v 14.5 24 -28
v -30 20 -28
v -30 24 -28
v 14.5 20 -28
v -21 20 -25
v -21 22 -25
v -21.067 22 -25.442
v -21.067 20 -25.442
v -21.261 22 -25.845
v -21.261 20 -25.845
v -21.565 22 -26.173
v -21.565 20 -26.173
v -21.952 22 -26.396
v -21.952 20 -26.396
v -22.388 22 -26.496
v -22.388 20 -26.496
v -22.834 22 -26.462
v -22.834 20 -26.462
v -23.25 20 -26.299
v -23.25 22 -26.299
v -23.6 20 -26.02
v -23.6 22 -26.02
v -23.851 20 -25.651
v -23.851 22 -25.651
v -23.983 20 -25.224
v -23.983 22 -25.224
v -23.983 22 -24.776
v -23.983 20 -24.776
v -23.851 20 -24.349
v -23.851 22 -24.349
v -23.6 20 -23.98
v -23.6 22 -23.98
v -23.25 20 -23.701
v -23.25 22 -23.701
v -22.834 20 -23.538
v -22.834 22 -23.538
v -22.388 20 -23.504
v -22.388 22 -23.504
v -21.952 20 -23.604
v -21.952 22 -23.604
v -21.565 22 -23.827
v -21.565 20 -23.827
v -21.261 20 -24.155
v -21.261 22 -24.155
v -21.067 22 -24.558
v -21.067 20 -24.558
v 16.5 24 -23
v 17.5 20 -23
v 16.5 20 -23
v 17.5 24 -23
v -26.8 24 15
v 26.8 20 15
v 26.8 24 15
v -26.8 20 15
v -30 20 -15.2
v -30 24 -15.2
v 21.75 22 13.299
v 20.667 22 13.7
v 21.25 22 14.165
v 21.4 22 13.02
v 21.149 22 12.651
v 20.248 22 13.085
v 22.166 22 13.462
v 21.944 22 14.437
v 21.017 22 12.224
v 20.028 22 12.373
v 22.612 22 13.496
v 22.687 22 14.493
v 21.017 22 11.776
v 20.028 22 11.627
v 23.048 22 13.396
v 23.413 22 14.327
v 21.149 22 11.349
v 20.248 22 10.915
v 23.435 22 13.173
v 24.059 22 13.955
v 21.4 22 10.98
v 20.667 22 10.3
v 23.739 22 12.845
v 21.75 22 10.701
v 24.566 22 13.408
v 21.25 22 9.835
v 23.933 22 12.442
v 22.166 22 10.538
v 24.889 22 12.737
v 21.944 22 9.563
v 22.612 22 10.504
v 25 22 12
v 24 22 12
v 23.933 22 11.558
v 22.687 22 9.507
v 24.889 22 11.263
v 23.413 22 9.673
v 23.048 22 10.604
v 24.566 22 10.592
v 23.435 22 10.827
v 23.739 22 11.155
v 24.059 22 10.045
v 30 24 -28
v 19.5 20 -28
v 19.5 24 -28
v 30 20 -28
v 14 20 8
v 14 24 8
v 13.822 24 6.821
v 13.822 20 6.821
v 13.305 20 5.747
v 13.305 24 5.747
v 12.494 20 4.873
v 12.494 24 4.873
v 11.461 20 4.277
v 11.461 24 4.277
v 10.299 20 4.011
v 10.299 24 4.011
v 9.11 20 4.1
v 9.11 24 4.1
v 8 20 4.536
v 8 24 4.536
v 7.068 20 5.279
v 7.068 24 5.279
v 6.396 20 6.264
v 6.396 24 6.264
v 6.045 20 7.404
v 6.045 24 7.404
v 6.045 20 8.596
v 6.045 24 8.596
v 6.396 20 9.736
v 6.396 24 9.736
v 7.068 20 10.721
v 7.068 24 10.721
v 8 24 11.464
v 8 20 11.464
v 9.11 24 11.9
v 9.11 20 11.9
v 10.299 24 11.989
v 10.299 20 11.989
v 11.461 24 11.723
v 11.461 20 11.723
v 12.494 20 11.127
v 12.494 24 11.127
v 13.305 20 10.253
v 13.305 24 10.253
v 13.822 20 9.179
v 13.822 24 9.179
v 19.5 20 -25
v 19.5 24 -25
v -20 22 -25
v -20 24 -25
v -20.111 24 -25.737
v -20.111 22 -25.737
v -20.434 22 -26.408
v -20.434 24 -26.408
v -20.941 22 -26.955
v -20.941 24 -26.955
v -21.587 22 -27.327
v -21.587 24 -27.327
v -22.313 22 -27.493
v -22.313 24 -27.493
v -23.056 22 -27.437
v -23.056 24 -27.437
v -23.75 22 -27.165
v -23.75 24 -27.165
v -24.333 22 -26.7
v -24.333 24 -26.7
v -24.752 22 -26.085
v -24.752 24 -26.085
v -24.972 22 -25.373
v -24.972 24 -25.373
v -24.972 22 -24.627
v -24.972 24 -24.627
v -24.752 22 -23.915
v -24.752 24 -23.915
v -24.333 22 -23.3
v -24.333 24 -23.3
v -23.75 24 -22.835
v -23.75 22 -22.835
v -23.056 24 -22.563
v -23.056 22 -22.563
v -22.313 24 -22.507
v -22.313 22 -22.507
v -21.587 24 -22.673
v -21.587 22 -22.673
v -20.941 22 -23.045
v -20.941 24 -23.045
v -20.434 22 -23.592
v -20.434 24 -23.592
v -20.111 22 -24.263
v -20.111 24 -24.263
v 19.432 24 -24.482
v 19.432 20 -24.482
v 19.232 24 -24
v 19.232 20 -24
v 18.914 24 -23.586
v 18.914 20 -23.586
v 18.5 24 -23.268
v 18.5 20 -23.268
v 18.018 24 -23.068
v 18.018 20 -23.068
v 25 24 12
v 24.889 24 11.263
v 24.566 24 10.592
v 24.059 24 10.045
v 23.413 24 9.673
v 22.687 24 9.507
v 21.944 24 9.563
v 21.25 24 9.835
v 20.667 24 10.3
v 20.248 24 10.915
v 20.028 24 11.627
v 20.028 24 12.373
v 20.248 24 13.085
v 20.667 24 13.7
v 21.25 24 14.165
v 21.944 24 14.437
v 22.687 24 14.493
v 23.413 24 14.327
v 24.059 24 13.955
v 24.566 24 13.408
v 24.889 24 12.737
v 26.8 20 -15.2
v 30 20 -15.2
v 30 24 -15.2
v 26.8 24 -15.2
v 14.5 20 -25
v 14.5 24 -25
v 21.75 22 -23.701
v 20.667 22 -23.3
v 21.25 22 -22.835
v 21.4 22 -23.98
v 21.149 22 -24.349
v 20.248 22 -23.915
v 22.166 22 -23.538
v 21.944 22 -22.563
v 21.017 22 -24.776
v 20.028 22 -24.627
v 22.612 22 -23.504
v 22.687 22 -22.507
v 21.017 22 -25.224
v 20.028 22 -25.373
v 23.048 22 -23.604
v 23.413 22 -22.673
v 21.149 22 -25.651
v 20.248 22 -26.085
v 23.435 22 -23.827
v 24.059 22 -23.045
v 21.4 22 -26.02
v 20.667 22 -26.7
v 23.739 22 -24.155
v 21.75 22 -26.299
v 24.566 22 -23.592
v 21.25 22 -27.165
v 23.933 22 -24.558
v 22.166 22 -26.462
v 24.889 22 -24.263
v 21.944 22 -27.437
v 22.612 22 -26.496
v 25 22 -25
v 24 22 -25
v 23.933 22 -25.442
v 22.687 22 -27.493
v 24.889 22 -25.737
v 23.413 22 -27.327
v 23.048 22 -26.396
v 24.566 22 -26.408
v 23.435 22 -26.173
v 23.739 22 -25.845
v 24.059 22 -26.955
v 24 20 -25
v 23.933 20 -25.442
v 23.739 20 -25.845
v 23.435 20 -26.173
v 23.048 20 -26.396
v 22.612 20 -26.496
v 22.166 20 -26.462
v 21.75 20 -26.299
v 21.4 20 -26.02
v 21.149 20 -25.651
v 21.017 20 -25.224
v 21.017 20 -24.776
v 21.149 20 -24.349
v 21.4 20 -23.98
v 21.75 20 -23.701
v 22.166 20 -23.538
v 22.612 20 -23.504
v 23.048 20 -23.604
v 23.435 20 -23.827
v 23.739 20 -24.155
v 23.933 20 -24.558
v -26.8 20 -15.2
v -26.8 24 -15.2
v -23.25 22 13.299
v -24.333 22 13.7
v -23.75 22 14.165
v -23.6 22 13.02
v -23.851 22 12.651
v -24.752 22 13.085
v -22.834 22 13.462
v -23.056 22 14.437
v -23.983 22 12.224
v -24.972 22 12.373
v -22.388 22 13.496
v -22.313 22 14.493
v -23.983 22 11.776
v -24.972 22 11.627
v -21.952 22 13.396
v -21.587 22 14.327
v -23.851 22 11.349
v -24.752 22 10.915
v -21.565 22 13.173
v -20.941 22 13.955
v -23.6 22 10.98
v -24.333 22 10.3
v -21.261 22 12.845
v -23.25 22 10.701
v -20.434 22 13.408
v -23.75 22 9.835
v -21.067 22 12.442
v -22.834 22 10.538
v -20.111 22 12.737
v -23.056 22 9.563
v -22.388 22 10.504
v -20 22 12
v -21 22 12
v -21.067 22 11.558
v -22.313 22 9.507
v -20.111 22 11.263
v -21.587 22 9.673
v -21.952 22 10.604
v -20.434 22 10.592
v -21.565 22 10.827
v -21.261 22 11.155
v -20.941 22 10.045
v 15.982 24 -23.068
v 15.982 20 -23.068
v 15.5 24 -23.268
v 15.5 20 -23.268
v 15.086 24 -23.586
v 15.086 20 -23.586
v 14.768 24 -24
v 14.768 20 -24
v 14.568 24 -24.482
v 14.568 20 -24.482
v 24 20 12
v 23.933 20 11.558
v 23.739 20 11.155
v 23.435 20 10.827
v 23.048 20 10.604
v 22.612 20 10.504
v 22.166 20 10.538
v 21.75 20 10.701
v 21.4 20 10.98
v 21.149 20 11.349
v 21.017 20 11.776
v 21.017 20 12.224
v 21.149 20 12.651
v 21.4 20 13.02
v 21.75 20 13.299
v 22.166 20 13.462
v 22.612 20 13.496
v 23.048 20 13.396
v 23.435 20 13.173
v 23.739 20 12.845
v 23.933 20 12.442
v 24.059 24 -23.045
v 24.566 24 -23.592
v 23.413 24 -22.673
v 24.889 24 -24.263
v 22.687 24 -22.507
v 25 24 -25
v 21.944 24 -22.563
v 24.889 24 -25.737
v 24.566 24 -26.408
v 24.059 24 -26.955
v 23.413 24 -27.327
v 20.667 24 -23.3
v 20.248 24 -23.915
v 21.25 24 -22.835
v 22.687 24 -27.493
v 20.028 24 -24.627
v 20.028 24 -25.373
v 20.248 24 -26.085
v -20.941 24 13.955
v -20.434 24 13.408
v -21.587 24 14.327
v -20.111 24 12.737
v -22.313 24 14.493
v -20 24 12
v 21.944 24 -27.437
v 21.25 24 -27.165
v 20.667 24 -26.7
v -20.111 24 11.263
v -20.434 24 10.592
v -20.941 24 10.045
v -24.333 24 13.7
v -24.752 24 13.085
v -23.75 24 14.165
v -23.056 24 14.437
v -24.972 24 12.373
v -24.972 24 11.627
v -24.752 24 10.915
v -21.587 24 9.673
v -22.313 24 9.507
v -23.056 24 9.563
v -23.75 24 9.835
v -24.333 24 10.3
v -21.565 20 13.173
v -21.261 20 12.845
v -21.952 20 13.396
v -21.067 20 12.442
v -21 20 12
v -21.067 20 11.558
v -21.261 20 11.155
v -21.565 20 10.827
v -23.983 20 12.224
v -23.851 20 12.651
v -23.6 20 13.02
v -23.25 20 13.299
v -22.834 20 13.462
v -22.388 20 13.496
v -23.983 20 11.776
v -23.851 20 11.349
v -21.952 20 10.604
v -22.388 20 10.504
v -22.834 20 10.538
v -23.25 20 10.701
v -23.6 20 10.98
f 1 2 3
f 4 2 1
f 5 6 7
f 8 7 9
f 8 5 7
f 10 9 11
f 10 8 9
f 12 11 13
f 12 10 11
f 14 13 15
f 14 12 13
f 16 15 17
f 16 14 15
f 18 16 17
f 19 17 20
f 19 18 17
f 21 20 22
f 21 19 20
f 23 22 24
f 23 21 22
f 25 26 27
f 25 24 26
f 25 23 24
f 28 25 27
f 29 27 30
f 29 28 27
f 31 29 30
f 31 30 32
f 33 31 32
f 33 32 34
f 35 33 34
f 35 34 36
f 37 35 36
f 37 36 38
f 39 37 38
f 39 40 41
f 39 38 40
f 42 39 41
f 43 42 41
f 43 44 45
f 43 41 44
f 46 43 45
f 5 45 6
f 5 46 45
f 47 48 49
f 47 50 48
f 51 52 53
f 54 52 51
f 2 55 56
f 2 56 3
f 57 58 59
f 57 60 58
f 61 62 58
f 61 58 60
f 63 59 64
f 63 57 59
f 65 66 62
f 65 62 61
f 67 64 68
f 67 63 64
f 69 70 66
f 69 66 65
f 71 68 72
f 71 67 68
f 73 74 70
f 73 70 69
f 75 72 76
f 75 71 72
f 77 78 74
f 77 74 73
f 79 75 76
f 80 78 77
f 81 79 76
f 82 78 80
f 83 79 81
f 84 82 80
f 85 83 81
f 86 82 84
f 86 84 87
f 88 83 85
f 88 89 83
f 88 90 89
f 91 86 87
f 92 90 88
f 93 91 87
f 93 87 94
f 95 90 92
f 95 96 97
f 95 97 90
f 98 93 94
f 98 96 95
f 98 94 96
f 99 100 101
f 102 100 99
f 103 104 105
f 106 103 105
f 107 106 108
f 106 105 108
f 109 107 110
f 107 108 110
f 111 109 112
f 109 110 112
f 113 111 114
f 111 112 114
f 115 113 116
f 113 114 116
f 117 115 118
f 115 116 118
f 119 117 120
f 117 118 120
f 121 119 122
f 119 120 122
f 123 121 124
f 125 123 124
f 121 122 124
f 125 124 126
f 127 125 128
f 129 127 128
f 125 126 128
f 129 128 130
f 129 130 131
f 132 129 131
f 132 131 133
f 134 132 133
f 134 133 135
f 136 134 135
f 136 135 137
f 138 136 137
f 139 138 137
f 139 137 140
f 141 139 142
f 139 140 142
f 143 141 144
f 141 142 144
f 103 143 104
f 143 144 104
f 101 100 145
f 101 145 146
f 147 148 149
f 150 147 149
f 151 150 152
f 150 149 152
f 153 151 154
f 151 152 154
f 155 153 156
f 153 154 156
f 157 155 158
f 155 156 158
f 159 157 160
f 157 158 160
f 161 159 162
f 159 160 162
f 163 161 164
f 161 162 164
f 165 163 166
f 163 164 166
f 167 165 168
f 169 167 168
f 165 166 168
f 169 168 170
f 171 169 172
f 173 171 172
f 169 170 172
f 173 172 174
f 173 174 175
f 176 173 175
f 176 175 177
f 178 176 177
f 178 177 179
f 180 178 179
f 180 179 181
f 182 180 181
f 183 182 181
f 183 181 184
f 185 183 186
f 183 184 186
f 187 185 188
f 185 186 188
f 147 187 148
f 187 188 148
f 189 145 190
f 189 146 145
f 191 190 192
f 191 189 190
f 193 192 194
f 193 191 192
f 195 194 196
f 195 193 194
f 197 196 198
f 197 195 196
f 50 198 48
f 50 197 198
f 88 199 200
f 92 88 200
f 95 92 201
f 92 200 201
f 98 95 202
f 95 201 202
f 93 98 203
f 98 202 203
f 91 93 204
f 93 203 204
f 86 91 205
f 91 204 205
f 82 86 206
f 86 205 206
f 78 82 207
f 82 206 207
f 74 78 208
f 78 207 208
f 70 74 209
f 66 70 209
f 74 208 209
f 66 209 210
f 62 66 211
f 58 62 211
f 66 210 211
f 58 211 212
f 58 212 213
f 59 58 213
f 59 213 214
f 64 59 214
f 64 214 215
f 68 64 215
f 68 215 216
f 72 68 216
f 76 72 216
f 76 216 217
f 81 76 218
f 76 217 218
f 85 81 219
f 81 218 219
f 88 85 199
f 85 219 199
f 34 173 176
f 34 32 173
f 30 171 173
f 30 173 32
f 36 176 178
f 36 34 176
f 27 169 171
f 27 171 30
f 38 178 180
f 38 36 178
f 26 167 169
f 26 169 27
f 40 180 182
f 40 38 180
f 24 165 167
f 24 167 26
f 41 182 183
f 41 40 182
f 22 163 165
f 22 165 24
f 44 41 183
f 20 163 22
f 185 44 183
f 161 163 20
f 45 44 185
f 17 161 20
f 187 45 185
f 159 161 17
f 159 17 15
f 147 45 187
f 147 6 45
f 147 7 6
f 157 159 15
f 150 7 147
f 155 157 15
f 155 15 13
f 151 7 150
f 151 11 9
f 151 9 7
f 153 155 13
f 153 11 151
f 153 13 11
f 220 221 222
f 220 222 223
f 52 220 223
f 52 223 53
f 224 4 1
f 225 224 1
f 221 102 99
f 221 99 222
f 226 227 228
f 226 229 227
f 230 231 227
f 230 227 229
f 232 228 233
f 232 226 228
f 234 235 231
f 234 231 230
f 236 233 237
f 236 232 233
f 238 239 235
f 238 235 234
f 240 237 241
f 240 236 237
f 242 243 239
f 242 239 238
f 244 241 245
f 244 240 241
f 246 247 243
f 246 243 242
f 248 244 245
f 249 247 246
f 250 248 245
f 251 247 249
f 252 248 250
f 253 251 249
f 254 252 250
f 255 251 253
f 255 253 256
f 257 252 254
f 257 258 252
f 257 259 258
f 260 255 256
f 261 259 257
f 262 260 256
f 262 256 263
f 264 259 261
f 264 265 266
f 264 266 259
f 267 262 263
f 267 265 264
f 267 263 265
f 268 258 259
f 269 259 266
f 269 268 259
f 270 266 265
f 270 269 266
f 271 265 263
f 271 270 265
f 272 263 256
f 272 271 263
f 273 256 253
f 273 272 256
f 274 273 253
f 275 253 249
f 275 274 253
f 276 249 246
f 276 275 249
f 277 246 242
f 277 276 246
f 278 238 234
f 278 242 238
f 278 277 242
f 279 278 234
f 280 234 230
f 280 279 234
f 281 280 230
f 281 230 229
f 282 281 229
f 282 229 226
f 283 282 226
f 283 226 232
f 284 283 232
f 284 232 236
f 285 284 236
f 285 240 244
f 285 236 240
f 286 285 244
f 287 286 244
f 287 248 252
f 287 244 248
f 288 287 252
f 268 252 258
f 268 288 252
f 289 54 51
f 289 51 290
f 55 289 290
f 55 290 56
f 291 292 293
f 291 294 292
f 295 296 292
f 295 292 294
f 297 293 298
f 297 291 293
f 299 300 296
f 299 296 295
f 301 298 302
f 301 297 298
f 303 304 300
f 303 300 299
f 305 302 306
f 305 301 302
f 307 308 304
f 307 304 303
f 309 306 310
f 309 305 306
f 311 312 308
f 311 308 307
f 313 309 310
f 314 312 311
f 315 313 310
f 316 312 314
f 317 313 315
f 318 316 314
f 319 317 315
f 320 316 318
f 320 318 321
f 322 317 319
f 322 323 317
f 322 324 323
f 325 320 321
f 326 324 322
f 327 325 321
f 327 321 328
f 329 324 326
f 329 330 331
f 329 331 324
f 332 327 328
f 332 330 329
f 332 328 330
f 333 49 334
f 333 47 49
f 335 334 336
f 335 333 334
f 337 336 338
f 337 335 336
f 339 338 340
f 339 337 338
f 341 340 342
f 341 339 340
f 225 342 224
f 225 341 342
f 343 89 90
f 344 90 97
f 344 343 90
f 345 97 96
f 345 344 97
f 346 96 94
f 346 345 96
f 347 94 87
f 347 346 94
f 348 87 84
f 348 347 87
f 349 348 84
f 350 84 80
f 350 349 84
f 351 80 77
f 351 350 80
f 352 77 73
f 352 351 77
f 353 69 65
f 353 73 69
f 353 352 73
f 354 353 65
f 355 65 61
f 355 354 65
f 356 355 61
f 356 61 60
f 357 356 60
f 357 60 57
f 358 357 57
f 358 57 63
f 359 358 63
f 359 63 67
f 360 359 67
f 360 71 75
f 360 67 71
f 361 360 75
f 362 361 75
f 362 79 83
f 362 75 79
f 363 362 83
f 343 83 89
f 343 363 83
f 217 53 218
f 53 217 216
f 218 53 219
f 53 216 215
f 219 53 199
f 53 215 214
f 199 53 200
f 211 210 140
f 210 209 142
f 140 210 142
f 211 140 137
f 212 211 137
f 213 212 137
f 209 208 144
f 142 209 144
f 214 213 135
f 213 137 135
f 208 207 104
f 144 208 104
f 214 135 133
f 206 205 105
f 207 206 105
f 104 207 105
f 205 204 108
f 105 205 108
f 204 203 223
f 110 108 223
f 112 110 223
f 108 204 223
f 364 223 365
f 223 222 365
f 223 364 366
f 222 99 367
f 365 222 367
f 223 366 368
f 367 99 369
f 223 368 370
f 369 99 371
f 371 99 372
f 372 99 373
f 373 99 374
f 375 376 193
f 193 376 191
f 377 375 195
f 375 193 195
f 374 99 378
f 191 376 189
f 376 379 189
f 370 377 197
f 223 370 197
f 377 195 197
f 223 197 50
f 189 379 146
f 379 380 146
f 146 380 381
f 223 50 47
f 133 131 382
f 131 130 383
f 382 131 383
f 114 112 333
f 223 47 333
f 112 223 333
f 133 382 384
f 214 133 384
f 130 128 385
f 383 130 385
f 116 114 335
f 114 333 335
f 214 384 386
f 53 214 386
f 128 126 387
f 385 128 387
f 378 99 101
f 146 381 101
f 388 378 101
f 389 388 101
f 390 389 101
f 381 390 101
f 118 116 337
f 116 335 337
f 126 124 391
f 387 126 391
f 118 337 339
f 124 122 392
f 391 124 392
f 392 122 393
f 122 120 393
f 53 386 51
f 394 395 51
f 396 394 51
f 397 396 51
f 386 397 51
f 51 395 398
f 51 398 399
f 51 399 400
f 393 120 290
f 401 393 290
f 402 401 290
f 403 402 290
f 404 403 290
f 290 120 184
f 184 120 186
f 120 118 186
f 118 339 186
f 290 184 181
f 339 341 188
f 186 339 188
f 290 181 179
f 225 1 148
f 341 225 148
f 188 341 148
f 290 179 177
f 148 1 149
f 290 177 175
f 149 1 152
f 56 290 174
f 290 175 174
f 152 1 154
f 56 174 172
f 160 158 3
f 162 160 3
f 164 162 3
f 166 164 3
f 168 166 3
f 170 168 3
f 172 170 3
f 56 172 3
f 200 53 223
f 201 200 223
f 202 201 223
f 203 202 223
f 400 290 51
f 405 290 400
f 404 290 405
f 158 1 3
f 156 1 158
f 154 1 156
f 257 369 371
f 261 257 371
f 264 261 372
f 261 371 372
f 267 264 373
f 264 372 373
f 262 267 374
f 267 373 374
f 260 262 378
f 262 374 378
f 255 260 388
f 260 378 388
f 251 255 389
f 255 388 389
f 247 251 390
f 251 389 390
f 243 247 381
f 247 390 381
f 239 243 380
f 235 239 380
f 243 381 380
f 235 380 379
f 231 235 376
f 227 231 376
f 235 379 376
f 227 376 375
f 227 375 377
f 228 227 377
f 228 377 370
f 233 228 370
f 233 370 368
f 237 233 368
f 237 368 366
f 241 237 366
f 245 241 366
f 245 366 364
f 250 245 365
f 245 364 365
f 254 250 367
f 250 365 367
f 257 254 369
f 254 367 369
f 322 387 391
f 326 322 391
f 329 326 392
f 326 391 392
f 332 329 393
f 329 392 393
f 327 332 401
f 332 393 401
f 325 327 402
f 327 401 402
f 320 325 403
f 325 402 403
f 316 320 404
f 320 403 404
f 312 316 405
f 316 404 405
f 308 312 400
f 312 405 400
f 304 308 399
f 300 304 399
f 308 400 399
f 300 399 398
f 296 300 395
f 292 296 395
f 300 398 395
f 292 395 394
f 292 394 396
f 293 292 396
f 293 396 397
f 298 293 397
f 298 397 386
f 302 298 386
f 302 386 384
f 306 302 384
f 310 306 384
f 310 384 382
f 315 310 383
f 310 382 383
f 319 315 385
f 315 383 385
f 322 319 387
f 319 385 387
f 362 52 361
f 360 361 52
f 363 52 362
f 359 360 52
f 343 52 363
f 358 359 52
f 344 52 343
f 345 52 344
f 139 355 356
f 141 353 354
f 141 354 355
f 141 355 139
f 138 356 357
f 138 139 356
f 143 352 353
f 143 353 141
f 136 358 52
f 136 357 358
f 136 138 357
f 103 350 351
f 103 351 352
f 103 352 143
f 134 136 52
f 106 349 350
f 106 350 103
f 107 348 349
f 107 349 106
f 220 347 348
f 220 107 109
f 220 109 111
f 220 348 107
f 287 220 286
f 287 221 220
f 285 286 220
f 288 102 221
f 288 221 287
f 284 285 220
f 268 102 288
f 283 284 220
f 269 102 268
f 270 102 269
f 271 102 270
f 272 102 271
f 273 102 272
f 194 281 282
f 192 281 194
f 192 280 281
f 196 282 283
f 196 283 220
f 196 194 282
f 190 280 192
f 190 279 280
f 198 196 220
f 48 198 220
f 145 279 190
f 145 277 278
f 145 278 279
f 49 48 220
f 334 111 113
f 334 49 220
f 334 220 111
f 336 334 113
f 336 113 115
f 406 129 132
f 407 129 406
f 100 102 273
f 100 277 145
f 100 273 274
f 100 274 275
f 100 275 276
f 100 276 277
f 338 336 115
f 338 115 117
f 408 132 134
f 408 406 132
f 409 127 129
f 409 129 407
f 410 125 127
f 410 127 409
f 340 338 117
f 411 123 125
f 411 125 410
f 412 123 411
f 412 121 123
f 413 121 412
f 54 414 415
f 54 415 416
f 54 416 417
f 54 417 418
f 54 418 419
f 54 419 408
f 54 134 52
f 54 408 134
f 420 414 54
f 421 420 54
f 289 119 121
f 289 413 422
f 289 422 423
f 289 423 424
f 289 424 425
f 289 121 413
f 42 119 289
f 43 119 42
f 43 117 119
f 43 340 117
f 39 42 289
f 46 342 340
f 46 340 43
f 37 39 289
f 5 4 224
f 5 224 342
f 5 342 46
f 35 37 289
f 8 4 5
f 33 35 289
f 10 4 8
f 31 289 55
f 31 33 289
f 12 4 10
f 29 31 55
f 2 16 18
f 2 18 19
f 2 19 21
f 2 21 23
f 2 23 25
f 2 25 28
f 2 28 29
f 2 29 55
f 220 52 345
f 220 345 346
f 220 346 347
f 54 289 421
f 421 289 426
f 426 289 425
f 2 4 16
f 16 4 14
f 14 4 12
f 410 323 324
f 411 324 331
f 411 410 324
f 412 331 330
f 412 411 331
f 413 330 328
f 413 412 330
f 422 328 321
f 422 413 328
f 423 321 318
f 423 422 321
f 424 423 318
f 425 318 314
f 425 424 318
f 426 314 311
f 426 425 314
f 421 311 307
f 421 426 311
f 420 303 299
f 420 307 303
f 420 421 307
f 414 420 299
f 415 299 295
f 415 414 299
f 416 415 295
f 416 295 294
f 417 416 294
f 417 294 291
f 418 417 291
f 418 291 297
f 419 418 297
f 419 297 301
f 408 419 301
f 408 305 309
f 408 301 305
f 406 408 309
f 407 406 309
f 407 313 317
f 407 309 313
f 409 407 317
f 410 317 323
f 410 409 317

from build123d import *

# Parameters (mm, degrees)
SKETCH060_R     = 1.5
PAD035_DEPTH    = 4
SKETCH061_R     = 2.5
POCKET025_DEPTH = 2
SKETCH048_W     = 5
SKETCH048_H     = 4
POCKET019_DEPTH = 5
FILLET012_R     = 2
FILLET013_R     = 2
SKETCH049_R     = 4
POCKET020_DEPTH = 4


with BuildPart() as part:
    # Sketch060 (on CopyDatumPlane) → Pad035 (new body)
    with BuildSketch(Plane(origin=(0, 20, 0), x_dir=(1, 0, 0), z_dir=(0, 1, 0))):
        Polygon((-30, 28), (30, 28), (30, 15.2), (26.8, 15.2), (26.8, -15), (-26.8, -15), (-26.8, 15.2), (-30, 15.2), align=None)
        with Locations((-22.5, 25)):
            Circle(SKETCH060_R, mode=Mode.SUBTRACT)
        with Locations((22.5, 25)):
            Circle(SKETCH060_R, mode=Mode.SUBTRACT)
        with Locations((22.5, -12)):
            Circle(SKETCH060_R, mode=Mode.SUBTRACT)
        with Locations((-22.5, -12)):
            Circle(SKETCH060_R, mode=Mode.SUBTRACT)
    extrude(amount=PAD035_DEPTH)

    # Sketch061 (on Face14 of Pad035) → Pocket025 (cut)
    with BuildSketch(Plane(origin=(0, 24, 0), x_dir=(1, 0, 0), z_dir=(0, 1, 0))):
        with Locations((-22.5, 25)):
            Circle(SKETCH061_R)
        with Locations((22.5, 25)):
            Circle(SKETCH061_R)
        with Locations((22.5, -12)):
            Circle(SKETCH061_R)
        with Locations((-22.5, -12)):
            Circle(SKETCH061_R)
    extrude(amount=-POCKET025_DEPTH, mode=Mode.SUBTRACT)

    # Sketch048 (on Face1 of Pocket025) → Pocket019 (cut)
    with BuildSketch(Plane(origin=(0, 20, -28), x_dir=(-1, 0, 0), z_dir=(0, 0, -1))):
        with Locations((-17, 2)):
            Rectangle(SKETCH048_W, SKETCH048_H)
    extrude(amount=-POCKET019_DEPTH, mode=Mode.SUBTRACT)

    # Fillet012
    fillet012_edges = [part.edges().sort_by_distance(p)[0] for p in [
        (19.5, 22, -23),
    ]]
    fillet(fillet012_edges, radius=FILLET012_R)

    # Fillet013
    fillet013_edges = [part.edges().sort_by_distance(p)[0] for p in [
        (14.5, 22, -23),
    ]]
    fillet(fillet013_edges, radius=FILLET013_R)

    # Sketch049 (on Face20 of Fillet013) → Pocket020 (cut)
    with BuildSketch(Plane(origin=(0, 24, 0), x_dir=(1, 0, 0), z_dir=(0, 1, 0))):
        with Locations((10, -8)):
            Circle(SKETCH049_R)
    extrude(amount=-POCKET020_DEPTH, mode=Mode.SUBTRACT)


solid = part.part
